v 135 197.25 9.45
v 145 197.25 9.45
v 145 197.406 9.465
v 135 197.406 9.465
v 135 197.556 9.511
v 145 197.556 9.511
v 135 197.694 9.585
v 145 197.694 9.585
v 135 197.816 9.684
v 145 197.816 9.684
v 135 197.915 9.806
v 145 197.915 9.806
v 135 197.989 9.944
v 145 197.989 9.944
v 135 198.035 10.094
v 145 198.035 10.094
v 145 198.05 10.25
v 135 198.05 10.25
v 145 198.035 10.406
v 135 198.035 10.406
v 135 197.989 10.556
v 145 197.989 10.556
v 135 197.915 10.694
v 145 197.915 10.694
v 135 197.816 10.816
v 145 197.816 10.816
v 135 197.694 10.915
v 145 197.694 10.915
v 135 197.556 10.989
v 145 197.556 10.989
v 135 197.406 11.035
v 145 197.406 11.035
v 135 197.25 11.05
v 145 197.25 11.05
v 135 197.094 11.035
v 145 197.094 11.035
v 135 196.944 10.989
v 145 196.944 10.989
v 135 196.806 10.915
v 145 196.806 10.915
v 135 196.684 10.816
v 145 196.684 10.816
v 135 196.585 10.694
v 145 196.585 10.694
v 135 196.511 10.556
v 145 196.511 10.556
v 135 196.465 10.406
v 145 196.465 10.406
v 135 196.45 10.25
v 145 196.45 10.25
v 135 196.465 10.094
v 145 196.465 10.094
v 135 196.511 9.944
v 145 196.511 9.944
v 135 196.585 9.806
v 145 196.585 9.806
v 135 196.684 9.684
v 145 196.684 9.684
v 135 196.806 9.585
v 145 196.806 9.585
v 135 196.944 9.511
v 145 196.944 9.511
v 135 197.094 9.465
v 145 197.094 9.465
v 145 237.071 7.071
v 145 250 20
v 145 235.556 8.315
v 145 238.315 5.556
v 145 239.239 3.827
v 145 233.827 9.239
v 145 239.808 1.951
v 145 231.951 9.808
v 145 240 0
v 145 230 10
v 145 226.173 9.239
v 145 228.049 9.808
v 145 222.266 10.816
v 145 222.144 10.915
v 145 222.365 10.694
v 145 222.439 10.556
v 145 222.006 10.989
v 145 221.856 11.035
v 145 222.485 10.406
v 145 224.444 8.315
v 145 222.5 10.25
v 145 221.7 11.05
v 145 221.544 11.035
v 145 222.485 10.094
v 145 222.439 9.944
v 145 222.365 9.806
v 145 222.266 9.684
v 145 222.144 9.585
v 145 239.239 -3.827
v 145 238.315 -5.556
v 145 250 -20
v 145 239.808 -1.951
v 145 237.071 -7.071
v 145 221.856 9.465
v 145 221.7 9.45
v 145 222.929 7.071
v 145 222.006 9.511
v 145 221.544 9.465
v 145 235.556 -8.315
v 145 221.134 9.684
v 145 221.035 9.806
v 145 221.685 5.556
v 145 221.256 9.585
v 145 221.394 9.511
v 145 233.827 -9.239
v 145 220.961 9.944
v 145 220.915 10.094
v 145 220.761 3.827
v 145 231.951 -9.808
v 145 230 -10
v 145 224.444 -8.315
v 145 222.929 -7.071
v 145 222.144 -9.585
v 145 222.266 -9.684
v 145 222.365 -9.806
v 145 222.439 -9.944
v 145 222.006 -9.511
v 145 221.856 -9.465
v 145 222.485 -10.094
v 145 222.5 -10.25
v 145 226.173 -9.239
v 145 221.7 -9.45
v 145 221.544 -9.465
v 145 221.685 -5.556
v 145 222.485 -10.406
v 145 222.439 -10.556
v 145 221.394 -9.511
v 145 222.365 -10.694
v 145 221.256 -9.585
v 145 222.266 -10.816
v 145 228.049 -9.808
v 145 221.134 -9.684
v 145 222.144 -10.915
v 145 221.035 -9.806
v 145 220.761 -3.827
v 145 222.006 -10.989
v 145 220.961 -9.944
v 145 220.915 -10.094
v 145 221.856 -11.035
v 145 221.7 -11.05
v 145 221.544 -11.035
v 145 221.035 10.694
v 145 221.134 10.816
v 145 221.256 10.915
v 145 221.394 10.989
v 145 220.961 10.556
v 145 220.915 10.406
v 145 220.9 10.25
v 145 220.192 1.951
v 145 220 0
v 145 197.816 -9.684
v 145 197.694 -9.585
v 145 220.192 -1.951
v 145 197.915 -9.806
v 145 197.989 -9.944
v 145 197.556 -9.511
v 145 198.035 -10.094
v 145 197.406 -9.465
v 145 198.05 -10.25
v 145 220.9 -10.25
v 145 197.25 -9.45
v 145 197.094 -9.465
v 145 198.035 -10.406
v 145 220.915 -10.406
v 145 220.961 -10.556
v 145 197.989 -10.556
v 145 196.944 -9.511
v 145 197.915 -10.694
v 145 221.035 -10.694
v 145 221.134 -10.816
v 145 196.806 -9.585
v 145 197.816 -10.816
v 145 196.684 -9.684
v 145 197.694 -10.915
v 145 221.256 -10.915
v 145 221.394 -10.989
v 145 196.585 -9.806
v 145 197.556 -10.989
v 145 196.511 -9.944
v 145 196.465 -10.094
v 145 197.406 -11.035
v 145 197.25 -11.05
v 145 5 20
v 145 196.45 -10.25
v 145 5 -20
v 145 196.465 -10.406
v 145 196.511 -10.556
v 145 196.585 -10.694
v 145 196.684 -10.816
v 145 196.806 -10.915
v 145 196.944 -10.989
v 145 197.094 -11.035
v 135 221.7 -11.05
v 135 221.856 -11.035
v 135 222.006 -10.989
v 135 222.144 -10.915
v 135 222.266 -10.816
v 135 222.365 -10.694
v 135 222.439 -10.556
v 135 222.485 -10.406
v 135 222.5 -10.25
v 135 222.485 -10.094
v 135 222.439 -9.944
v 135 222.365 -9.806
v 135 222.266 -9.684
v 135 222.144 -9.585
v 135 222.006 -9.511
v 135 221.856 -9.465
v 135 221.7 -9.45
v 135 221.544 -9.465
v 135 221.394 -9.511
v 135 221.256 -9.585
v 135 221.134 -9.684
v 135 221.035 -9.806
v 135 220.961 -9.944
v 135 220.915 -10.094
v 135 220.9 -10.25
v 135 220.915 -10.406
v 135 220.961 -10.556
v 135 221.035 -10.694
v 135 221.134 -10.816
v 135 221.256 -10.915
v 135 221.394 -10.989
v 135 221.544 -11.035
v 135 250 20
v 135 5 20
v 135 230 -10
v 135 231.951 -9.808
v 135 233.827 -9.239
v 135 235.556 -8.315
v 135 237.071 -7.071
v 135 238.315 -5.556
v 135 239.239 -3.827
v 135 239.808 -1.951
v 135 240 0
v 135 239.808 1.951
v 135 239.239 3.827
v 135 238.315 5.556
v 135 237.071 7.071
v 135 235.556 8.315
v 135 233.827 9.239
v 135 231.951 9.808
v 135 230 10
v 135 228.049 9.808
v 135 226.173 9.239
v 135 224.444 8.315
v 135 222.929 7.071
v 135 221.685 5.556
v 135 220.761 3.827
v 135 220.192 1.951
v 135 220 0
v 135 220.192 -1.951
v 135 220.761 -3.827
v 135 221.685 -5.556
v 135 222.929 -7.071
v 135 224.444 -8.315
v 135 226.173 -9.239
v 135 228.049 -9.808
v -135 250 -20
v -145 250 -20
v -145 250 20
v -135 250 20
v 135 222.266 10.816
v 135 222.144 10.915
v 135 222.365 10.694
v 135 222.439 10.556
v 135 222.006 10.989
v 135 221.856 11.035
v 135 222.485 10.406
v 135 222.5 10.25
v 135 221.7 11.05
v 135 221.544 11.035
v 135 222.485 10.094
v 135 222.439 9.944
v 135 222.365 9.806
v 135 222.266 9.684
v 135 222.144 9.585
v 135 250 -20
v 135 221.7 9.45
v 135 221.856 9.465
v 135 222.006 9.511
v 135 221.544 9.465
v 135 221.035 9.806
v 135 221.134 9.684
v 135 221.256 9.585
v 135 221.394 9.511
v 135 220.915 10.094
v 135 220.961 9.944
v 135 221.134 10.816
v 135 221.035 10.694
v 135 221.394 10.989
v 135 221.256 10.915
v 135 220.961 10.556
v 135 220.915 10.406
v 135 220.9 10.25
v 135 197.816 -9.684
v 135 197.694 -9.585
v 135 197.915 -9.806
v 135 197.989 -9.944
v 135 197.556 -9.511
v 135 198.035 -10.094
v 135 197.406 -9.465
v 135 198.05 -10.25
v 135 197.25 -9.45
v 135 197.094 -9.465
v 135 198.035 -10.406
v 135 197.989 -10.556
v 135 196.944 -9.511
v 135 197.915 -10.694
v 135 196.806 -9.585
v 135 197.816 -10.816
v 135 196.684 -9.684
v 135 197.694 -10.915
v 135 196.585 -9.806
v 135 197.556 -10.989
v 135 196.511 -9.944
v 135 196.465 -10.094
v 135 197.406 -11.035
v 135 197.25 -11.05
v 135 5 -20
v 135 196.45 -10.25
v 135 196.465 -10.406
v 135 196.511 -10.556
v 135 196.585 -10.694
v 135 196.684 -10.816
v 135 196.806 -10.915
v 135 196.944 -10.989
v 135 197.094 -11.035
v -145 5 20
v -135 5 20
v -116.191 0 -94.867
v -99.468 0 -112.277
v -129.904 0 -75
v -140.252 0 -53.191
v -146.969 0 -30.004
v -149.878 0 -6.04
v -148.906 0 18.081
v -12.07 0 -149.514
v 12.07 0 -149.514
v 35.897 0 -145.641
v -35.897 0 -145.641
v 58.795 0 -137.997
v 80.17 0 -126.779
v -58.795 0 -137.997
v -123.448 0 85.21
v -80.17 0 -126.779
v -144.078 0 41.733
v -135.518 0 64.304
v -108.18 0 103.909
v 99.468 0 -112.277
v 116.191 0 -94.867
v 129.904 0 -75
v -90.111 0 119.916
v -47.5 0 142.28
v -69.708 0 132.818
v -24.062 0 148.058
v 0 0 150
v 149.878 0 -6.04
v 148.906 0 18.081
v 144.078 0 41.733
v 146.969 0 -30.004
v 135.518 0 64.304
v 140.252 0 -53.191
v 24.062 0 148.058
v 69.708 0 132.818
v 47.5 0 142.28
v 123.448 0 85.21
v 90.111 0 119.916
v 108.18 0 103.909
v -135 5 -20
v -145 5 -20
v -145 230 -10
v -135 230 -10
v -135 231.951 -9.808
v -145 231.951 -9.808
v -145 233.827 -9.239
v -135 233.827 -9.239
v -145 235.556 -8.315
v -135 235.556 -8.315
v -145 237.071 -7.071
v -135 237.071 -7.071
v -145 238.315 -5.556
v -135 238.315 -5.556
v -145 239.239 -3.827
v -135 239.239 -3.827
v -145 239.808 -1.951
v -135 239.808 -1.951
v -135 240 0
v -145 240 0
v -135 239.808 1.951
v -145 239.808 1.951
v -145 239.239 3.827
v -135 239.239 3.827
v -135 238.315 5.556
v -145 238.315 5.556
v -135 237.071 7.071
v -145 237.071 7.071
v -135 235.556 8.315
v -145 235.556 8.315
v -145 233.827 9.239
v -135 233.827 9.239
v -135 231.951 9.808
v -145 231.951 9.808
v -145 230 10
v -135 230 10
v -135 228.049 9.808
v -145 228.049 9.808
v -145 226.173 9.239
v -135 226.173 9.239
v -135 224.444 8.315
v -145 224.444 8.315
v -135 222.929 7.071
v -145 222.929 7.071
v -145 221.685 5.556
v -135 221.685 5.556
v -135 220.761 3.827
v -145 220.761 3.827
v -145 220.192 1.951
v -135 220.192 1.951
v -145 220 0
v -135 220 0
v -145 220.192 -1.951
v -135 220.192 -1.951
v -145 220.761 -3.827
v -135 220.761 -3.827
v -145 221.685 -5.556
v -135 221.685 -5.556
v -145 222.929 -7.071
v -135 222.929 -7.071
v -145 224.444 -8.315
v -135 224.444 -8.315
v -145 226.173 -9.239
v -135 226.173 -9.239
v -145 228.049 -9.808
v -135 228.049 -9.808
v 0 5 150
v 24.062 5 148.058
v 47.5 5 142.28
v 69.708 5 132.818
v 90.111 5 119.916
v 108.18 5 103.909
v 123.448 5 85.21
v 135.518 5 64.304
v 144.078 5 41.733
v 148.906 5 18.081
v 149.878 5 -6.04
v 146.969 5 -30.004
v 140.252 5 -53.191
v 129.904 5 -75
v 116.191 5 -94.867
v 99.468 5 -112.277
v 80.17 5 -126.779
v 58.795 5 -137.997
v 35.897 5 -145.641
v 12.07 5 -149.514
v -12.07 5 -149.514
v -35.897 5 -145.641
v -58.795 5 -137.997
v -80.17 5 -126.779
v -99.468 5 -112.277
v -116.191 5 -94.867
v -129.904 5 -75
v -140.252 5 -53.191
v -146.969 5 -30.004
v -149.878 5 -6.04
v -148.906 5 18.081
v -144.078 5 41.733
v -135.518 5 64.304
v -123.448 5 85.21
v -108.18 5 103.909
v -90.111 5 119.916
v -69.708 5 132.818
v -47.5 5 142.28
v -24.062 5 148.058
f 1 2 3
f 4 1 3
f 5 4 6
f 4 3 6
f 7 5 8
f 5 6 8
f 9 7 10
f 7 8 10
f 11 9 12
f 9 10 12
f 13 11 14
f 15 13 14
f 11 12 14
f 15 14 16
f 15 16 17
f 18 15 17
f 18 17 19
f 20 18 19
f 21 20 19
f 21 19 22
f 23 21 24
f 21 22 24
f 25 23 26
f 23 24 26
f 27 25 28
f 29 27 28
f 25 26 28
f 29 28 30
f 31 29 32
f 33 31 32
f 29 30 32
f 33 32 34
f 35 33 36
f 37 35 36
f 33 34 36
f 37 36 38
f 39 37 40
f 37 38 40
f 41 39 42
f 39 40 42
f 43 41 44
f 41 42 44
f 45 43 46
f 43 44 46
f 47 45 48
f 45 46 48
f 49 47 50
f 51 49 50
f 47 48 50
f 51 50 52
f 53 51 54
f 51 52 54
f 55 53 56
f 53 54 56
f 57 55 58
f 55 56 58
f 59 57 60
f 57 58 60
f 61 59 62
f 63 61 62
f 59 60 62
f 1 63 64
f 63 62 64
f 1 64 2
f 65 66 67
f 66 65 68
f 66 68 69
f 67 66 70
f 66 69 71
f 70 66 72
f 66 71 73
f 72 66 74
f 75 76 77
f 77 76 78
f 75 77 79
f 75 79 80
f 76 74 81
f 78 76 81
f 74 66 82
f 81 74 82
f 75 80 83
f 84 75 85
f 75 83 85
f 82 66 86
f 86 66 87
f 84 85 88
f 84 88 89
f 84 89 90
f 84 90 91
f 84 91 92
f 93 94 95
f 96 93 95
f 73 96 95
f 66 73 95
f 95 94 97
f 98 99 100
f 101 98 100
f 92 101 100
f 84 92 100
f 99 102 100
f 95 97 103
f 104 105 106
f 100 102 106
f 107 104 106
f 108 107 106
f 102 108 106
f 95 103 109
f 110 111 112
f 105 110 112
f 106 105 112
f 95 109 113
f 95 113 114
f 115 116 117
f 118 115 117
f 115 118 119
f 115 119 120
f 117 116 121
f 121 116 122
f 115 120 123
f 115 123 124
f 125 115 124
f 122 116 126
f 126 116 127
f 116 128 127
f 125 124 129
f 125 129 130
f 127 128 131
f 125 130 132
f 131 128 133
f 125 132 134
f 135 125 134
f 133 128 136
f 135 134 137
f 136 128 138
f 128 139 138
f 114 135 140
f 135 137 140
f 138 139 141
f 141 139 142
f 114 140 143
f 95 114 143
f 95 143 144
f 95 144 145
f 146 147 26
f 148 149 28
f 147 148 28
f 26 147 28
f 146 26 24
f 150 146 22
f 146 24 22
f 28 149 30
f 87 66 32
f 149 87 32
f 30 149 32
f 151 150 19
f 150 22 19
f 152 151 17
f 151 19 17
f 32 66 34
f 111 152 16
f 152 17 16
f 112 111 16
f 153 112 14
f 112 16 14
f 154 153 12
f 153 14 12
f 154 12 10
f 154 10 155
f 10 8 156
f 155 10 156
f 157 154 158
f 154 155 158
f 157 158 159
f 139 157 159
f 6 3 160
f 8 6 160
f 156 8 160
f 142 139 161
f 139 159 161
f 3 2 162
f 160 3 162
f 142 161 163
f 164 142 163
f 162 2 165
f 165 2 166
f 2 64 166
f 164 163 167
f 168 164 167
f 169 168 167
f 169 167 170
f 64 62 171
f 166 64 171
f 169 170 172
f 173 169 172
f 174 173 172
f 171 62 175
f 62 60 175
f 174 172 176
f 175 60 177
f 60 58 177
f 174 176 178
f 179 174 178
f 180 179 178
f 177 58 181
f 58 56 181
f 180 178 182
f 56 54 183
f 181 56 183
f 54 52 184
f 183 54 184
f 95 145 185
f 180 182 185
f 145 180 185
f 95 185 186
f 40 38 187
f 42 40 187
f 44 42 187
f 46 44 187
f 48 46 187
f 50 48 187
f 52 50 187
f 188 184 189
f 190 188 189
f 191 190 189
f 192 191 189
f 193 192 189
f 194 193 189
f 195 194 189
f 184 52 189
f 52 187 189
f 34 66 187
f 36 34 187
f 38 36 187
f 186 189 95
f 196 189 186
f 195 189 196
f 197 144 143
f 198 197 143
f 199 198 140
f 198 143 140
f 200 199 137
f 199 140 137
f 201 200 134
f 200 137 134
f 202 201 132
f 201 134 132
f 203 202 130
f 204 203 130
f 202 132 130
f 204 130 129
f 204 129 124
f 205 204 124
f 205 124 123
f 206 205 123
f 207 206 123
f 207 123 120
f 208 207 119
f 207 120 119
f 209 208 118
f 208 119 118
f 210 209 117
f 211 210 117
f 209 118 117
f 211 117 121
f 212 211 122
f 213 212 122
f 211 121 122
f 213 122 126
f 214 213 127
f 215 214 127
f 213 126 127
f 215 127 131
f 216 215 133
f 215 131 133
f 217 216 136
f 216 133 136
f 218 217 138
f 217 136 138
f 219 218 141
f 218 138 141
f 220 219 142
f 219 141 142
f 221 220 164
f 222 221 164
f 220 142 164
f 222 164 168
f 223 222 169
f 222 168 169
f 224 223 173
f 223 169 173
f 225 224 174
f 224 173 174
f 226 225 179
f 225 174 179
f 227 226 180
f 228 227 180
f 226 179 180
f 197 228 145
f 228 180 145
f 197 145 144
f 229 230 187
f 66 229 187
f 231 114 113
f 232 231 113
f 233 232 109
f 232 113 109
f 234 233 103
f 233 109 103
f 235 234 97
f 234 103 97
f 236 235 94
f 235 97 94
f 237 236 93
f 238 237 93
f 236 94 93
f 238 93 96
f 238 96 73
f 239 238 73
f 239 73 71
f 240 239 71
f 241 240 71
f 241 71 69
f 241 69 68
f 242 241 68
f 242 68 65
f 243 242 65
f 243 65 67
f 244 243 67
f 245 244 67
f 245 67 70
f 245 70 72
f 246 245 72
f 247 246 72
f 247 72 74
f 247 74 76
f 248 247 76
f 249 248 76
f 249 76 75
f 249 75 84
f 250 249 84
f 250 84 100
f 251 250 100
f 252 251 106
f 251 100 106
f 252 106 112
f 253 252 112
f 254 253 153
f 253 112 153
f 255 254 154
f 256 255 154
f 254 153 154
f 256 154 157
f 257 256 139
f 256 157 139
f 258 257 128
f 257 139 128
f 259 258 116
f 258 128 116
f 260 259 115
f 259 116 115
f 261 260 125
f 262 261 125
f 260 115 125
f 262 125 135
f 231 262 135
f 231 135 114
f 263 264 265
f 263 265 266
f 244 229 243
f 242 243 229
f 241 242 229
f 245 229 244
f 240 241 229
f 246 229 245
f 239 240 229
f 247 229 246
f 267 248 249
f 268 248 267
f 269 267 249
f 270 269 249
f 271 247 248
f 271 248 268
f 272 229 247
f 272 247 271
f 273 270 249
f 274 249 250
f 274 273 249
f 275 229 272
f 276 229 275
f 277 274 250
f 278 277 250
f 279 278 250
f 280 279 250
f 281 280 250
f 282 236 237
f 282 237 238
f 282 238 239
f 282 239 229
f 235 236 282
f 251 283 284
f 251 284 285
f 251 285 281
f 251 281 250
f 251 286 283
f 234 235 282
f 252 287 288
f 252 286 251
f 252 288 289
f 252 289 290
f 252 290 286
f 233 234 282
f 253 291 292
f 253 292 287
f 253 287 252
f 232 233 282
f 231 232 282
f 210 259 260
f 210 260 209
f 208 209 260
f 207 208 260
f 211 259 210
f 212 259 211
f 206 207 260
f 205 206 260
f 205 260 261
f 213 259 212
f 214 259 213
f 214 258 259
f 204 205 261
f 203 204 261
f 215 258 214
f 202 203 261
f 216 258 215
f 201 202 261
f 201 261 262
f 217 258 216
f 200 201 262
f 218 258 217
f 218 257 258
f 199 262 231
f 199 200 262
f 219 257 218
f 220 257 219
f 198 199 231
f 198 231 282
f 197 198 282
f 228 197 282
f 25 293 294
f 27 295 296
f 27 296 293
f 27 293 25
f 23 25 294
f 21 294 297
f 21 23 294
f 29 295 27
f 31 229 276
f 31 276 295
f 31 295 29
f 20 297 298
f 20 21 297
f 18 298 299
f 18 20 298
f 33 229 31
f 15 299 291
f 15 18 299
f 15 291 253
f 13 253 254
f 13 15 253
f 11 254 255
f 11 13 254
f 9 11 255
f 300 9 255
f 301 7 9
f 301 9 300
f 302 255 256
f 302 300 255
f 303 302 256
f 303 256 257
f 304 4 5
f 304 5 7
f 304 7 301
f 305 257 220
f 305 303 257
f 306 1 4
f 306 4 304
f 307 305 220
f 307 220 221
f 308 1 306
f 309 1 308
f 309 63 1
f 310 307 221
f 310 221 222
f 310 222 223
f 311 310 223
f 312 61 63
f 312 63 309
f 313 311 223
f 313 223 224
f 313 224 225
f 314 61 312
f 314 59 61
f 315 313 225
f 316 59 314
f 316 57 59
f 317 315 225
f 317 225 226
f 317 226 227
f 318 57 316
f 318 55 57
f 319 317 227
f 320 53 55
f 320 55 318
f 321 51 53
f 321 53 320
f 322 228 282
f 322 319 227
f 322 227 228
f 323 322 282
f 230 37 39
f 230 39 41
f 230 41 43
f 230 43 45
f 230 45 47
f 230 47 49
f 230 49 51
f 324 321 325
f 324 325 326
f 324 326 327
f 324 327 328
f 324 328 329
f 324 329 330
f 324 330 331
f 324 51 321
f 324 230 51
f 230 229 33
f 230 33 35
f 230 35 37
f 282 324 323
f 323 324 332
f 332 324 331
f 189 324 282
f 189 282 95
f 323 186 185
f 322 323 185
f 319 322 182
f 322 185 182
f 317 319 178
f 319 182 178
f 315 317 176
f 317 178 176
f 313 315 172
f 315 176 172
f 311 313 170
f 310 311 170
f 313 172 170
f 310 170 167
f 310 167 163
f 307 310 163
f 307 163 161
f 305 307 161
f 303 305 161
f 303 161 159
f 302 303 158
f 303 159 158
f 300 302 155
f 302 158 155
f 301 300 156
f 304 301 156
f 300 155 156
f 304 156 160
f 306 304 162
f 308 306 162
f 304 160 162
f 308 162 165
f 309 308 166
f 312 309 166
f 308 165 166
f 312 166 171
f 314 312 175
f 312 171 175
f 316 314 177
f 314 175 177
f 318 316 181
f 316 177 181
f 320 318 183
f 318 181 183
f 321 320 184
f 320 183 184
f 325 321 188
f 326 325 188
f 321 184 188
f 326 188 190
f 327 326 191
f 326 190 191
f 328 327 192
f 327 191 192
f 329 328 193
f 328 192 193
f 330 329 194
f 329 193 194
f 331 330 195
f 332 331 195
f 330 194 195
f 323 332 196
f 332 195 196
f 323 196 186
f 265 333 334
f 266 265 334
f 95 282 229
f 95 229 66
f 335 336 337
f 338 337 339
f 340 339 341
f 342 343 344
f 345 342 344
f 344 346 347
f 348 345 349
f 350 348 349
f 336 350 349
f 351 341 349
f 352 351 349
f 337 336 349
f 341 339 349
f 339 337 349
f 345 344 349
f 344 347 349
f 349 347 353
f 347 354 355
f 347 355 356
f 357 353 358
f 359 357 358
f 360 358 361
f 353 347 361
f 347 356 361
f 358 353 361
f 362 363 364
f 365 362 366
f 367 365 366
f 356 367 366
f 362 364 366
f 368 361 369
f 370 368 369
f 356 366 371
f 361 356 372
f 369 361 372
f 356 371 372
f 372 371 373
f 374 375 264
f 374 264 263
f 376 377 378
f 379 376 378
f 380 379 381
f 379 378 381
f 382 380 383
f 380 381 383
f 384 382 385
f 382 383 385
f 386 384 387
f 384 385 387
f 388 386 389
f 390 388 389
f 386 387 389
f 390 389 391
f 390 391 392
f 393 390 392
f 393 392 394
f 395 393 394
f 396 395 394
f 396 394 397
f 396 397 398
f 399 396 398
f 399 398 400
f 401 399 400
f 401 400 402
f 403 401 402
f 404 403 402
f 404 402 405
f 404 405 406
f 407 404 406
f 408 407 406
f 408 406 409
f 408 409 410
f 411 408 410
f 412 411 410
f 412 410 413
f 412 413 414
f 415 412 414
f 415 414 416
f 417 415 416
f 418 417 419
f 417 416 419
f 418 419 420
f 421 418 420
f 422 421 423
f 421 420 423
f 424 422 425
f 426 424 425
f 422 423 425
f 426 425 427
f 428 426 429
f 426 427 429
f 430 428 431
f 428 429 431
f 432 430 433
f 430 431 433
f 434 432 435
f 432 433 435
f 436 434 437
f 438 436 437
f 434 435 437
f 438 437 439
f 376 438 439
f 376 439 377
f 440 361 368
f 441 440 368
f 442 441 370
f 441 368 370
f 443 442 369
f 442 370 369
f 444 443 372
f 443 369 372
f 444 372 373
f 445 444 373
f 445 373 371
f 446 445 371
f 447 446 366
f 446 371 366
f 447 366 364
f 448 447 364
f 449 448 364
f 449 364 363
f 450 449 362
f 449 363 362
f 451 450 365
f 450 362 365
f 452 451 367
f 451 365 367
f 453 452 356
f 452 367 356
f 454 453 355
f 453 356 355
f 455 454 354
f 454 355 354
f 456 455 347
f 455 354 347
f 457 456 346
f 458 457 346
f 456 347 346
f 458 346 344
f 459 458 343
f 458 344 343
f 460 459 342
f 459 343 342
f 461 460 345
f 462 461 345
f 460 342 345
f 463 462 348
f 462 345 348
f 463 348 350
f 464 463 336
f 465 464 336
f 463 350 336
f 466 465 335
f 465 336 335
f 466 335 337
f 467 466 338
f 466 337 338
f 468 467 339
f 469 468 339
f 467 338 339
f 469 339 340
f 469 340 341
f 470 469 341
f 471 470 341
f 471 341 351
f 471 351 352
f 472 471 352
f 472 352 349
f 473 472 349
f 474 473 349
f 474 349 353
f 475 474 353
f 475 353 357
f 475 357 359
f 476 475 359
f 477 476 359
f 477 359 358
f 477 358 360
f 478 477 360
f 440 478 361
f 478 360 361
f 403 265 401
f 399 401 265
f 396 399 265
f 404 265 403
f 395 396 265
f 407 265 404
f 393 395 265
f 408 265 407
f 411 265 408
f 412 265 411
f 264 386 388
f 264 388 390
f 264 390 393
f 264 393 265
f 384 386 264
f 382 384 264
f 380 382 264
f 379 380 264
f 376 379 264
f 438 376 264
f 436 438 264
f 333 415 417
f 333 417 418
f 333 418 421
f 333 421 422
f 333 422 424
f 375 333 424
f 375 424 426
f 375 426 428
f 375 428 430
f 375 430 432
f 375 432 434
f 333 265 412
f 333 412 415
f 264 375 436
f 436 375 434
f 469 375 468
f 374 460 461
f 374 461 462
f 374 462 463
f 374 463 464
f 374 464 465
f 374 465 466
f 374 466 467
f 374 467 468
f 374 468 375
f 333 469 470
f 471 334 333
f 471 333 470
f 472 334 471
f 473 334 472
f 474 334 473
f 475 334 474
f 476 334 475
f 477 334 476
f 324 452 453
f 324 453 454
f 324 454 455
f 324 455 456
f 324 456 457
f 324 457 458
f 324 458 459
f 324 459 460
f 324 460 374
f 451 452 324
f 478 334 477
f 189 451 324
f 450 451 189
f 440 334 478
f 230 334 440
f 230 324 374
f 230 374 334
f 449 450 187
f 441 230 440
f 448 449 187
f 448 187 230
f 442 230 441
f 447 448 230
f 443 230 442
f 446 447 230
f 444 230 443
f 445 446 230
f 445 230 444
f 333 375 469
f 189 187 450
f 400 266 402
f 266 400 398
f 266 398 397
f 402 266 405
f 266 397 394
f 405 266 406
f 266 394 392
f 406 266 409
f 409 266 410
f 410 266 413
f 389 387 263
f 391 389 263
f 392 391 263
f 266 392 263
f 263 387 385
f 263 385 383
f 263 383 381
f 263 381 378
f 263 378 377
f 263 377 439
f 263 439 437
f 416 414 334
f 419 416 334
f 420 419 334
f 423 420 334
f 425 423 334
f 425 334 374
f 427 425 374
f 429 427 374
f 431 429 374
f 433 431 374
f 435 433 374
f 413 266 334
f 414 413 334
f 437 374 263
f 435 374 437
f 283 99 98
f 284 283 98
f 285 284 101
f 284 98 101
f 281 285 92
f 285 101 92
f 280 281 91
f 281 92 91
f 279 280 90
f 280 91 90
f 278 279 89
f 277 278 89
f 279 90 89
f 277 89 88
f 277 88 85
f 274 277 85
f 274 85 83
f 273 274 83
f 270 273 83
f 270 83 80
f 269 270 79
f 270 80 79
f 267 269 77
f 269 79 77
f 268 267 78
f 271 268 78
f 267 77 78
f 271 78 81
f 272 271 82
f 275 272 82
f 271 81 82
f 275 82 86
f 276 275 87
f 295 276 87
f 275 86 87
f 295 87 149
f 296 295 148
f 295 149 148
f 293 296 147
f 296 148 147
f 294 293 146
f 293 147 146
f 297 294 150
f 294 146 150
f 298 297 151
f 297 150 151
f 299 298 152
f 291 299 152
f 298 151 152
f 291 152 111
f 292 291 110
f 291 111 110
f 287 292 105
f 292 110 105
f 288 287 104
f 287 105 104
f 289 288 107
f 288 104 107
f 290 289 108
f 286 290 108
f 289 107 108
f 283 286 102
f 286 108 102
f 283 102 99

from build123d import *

# Parameters (mm, degrees)
SZKIC1_W                      = 10
SZKIC1_H                      = 40
DODANIE_WYCI_GNI_CIE1_DEPTH   = 250
DODANIE_WYCI_GNI_CIE1_2_DEPTH = 250
SZKIC1_3_R                    = 150
DODANIE_WYCI_GNI_CIE2_DEPTH   = 5
SZKIC2_R                      = 10
WYTNIJ_WYCI_GNI_CIE1_DEPTH    = 290
SZKIC3_R                      = 0.8
WYTNIJ_WYCI_GNI_CIE4_DEPTH    = 10


with BuildPart() as part:
    # Szkic1 → Dodanie-wyciągnięcie1 (new body)
    with BuildSketch(Plane(origin=(0, 0, 0), x_dir=(1, 0, 0), z_dir=(0, 1, 0))):
        with Locations((140, 0)):
            Rectangle(SZKIC1_W, SZKIC1_H)
    extrude(amount=DODANIE_WYCI_GNI_CIE1_DEPTH)



with BuildPart() as body_2:
    # Szkic1 → Dodanie-wyci_gni_cie1 2 (new body)
    with BuildSketch(Plane(origin=(0, 0, 0), x_dir=(1, 0, 0), z_dir=(0, 1, 0))):
        with Locations((-140, 0)):
            Rectangle(SZKIC1_W, SZKIC1_H)
    extrude(amount=DODANIE_WYCI_GNI_CIE1_2_DEPTH)


with BuildPart() as part_1:
    add(part.part)

    add(body_2.part)  # Dodanie-wyciągnięcie2 merges body 2
    # Szkic1<3> → Dodanie-wyciągnięcie2 (add)
    with BuildSketch(Plane(origin=(0, 0, 0), x_dir=(1, 0, 0), z_dir=(0, 1, 0))):
        Circle(SZKIC1_3_R)
        Polygon((-135, 20), (-135, 0), (-135, -20), (-140, -20), (-145, -20), (-145, 20), (-140, 20), align=None, mode=Mode.SUBTRACT)
        Polygon((135, -20), (135, 0), (135, 20), (140, 20), (145, 20), (145, -20), (140, -20), align=None, mode=Mode.SUBTRACT)
    extrude(amount=DODANIE_WYCI_GNI_CIE2_DEPTH)

    # Szkic2 → Wytnij-wyciągnięcie1 (cut)
    with BuildSketch(Plane(origin=(145, 0, 0), x_dir=(0, 0, -1), z_dir=(1, 0, 0))):
        with Locations((0, 230)):
            Circle(SZKIC2_R)
    extrude(amount=-WYTNIJ_WYCI_GNI_CIE1_DEPTH, mode=Mode.SUBTRACT)

    # Szkic3 → Wytnij-wyciągnięcie4 (cut)
    with BuildSketch(Plane(origin=(145, 0, 0), x_dir=(0, 0, -1), z_dir=(1, 0, 0))):
        with Locations((-10.25, 221.7)):
            Circle(SZKIC3_R)
        with Locations((10.25, 197.25)):
            Circle(SZKIC3_R)
        with Locations((10.25, 221.7)):
            Circle(SZKIC3_R)
        with Locations((-10.25, 197.25)):
            Circle(SZKIC3_R)
    extrude(amount=-WYTNIJ_WYCI_GNI_CIE4_DEPTH, mode=Mode.SUBTRACT)


solid = part_1.part
